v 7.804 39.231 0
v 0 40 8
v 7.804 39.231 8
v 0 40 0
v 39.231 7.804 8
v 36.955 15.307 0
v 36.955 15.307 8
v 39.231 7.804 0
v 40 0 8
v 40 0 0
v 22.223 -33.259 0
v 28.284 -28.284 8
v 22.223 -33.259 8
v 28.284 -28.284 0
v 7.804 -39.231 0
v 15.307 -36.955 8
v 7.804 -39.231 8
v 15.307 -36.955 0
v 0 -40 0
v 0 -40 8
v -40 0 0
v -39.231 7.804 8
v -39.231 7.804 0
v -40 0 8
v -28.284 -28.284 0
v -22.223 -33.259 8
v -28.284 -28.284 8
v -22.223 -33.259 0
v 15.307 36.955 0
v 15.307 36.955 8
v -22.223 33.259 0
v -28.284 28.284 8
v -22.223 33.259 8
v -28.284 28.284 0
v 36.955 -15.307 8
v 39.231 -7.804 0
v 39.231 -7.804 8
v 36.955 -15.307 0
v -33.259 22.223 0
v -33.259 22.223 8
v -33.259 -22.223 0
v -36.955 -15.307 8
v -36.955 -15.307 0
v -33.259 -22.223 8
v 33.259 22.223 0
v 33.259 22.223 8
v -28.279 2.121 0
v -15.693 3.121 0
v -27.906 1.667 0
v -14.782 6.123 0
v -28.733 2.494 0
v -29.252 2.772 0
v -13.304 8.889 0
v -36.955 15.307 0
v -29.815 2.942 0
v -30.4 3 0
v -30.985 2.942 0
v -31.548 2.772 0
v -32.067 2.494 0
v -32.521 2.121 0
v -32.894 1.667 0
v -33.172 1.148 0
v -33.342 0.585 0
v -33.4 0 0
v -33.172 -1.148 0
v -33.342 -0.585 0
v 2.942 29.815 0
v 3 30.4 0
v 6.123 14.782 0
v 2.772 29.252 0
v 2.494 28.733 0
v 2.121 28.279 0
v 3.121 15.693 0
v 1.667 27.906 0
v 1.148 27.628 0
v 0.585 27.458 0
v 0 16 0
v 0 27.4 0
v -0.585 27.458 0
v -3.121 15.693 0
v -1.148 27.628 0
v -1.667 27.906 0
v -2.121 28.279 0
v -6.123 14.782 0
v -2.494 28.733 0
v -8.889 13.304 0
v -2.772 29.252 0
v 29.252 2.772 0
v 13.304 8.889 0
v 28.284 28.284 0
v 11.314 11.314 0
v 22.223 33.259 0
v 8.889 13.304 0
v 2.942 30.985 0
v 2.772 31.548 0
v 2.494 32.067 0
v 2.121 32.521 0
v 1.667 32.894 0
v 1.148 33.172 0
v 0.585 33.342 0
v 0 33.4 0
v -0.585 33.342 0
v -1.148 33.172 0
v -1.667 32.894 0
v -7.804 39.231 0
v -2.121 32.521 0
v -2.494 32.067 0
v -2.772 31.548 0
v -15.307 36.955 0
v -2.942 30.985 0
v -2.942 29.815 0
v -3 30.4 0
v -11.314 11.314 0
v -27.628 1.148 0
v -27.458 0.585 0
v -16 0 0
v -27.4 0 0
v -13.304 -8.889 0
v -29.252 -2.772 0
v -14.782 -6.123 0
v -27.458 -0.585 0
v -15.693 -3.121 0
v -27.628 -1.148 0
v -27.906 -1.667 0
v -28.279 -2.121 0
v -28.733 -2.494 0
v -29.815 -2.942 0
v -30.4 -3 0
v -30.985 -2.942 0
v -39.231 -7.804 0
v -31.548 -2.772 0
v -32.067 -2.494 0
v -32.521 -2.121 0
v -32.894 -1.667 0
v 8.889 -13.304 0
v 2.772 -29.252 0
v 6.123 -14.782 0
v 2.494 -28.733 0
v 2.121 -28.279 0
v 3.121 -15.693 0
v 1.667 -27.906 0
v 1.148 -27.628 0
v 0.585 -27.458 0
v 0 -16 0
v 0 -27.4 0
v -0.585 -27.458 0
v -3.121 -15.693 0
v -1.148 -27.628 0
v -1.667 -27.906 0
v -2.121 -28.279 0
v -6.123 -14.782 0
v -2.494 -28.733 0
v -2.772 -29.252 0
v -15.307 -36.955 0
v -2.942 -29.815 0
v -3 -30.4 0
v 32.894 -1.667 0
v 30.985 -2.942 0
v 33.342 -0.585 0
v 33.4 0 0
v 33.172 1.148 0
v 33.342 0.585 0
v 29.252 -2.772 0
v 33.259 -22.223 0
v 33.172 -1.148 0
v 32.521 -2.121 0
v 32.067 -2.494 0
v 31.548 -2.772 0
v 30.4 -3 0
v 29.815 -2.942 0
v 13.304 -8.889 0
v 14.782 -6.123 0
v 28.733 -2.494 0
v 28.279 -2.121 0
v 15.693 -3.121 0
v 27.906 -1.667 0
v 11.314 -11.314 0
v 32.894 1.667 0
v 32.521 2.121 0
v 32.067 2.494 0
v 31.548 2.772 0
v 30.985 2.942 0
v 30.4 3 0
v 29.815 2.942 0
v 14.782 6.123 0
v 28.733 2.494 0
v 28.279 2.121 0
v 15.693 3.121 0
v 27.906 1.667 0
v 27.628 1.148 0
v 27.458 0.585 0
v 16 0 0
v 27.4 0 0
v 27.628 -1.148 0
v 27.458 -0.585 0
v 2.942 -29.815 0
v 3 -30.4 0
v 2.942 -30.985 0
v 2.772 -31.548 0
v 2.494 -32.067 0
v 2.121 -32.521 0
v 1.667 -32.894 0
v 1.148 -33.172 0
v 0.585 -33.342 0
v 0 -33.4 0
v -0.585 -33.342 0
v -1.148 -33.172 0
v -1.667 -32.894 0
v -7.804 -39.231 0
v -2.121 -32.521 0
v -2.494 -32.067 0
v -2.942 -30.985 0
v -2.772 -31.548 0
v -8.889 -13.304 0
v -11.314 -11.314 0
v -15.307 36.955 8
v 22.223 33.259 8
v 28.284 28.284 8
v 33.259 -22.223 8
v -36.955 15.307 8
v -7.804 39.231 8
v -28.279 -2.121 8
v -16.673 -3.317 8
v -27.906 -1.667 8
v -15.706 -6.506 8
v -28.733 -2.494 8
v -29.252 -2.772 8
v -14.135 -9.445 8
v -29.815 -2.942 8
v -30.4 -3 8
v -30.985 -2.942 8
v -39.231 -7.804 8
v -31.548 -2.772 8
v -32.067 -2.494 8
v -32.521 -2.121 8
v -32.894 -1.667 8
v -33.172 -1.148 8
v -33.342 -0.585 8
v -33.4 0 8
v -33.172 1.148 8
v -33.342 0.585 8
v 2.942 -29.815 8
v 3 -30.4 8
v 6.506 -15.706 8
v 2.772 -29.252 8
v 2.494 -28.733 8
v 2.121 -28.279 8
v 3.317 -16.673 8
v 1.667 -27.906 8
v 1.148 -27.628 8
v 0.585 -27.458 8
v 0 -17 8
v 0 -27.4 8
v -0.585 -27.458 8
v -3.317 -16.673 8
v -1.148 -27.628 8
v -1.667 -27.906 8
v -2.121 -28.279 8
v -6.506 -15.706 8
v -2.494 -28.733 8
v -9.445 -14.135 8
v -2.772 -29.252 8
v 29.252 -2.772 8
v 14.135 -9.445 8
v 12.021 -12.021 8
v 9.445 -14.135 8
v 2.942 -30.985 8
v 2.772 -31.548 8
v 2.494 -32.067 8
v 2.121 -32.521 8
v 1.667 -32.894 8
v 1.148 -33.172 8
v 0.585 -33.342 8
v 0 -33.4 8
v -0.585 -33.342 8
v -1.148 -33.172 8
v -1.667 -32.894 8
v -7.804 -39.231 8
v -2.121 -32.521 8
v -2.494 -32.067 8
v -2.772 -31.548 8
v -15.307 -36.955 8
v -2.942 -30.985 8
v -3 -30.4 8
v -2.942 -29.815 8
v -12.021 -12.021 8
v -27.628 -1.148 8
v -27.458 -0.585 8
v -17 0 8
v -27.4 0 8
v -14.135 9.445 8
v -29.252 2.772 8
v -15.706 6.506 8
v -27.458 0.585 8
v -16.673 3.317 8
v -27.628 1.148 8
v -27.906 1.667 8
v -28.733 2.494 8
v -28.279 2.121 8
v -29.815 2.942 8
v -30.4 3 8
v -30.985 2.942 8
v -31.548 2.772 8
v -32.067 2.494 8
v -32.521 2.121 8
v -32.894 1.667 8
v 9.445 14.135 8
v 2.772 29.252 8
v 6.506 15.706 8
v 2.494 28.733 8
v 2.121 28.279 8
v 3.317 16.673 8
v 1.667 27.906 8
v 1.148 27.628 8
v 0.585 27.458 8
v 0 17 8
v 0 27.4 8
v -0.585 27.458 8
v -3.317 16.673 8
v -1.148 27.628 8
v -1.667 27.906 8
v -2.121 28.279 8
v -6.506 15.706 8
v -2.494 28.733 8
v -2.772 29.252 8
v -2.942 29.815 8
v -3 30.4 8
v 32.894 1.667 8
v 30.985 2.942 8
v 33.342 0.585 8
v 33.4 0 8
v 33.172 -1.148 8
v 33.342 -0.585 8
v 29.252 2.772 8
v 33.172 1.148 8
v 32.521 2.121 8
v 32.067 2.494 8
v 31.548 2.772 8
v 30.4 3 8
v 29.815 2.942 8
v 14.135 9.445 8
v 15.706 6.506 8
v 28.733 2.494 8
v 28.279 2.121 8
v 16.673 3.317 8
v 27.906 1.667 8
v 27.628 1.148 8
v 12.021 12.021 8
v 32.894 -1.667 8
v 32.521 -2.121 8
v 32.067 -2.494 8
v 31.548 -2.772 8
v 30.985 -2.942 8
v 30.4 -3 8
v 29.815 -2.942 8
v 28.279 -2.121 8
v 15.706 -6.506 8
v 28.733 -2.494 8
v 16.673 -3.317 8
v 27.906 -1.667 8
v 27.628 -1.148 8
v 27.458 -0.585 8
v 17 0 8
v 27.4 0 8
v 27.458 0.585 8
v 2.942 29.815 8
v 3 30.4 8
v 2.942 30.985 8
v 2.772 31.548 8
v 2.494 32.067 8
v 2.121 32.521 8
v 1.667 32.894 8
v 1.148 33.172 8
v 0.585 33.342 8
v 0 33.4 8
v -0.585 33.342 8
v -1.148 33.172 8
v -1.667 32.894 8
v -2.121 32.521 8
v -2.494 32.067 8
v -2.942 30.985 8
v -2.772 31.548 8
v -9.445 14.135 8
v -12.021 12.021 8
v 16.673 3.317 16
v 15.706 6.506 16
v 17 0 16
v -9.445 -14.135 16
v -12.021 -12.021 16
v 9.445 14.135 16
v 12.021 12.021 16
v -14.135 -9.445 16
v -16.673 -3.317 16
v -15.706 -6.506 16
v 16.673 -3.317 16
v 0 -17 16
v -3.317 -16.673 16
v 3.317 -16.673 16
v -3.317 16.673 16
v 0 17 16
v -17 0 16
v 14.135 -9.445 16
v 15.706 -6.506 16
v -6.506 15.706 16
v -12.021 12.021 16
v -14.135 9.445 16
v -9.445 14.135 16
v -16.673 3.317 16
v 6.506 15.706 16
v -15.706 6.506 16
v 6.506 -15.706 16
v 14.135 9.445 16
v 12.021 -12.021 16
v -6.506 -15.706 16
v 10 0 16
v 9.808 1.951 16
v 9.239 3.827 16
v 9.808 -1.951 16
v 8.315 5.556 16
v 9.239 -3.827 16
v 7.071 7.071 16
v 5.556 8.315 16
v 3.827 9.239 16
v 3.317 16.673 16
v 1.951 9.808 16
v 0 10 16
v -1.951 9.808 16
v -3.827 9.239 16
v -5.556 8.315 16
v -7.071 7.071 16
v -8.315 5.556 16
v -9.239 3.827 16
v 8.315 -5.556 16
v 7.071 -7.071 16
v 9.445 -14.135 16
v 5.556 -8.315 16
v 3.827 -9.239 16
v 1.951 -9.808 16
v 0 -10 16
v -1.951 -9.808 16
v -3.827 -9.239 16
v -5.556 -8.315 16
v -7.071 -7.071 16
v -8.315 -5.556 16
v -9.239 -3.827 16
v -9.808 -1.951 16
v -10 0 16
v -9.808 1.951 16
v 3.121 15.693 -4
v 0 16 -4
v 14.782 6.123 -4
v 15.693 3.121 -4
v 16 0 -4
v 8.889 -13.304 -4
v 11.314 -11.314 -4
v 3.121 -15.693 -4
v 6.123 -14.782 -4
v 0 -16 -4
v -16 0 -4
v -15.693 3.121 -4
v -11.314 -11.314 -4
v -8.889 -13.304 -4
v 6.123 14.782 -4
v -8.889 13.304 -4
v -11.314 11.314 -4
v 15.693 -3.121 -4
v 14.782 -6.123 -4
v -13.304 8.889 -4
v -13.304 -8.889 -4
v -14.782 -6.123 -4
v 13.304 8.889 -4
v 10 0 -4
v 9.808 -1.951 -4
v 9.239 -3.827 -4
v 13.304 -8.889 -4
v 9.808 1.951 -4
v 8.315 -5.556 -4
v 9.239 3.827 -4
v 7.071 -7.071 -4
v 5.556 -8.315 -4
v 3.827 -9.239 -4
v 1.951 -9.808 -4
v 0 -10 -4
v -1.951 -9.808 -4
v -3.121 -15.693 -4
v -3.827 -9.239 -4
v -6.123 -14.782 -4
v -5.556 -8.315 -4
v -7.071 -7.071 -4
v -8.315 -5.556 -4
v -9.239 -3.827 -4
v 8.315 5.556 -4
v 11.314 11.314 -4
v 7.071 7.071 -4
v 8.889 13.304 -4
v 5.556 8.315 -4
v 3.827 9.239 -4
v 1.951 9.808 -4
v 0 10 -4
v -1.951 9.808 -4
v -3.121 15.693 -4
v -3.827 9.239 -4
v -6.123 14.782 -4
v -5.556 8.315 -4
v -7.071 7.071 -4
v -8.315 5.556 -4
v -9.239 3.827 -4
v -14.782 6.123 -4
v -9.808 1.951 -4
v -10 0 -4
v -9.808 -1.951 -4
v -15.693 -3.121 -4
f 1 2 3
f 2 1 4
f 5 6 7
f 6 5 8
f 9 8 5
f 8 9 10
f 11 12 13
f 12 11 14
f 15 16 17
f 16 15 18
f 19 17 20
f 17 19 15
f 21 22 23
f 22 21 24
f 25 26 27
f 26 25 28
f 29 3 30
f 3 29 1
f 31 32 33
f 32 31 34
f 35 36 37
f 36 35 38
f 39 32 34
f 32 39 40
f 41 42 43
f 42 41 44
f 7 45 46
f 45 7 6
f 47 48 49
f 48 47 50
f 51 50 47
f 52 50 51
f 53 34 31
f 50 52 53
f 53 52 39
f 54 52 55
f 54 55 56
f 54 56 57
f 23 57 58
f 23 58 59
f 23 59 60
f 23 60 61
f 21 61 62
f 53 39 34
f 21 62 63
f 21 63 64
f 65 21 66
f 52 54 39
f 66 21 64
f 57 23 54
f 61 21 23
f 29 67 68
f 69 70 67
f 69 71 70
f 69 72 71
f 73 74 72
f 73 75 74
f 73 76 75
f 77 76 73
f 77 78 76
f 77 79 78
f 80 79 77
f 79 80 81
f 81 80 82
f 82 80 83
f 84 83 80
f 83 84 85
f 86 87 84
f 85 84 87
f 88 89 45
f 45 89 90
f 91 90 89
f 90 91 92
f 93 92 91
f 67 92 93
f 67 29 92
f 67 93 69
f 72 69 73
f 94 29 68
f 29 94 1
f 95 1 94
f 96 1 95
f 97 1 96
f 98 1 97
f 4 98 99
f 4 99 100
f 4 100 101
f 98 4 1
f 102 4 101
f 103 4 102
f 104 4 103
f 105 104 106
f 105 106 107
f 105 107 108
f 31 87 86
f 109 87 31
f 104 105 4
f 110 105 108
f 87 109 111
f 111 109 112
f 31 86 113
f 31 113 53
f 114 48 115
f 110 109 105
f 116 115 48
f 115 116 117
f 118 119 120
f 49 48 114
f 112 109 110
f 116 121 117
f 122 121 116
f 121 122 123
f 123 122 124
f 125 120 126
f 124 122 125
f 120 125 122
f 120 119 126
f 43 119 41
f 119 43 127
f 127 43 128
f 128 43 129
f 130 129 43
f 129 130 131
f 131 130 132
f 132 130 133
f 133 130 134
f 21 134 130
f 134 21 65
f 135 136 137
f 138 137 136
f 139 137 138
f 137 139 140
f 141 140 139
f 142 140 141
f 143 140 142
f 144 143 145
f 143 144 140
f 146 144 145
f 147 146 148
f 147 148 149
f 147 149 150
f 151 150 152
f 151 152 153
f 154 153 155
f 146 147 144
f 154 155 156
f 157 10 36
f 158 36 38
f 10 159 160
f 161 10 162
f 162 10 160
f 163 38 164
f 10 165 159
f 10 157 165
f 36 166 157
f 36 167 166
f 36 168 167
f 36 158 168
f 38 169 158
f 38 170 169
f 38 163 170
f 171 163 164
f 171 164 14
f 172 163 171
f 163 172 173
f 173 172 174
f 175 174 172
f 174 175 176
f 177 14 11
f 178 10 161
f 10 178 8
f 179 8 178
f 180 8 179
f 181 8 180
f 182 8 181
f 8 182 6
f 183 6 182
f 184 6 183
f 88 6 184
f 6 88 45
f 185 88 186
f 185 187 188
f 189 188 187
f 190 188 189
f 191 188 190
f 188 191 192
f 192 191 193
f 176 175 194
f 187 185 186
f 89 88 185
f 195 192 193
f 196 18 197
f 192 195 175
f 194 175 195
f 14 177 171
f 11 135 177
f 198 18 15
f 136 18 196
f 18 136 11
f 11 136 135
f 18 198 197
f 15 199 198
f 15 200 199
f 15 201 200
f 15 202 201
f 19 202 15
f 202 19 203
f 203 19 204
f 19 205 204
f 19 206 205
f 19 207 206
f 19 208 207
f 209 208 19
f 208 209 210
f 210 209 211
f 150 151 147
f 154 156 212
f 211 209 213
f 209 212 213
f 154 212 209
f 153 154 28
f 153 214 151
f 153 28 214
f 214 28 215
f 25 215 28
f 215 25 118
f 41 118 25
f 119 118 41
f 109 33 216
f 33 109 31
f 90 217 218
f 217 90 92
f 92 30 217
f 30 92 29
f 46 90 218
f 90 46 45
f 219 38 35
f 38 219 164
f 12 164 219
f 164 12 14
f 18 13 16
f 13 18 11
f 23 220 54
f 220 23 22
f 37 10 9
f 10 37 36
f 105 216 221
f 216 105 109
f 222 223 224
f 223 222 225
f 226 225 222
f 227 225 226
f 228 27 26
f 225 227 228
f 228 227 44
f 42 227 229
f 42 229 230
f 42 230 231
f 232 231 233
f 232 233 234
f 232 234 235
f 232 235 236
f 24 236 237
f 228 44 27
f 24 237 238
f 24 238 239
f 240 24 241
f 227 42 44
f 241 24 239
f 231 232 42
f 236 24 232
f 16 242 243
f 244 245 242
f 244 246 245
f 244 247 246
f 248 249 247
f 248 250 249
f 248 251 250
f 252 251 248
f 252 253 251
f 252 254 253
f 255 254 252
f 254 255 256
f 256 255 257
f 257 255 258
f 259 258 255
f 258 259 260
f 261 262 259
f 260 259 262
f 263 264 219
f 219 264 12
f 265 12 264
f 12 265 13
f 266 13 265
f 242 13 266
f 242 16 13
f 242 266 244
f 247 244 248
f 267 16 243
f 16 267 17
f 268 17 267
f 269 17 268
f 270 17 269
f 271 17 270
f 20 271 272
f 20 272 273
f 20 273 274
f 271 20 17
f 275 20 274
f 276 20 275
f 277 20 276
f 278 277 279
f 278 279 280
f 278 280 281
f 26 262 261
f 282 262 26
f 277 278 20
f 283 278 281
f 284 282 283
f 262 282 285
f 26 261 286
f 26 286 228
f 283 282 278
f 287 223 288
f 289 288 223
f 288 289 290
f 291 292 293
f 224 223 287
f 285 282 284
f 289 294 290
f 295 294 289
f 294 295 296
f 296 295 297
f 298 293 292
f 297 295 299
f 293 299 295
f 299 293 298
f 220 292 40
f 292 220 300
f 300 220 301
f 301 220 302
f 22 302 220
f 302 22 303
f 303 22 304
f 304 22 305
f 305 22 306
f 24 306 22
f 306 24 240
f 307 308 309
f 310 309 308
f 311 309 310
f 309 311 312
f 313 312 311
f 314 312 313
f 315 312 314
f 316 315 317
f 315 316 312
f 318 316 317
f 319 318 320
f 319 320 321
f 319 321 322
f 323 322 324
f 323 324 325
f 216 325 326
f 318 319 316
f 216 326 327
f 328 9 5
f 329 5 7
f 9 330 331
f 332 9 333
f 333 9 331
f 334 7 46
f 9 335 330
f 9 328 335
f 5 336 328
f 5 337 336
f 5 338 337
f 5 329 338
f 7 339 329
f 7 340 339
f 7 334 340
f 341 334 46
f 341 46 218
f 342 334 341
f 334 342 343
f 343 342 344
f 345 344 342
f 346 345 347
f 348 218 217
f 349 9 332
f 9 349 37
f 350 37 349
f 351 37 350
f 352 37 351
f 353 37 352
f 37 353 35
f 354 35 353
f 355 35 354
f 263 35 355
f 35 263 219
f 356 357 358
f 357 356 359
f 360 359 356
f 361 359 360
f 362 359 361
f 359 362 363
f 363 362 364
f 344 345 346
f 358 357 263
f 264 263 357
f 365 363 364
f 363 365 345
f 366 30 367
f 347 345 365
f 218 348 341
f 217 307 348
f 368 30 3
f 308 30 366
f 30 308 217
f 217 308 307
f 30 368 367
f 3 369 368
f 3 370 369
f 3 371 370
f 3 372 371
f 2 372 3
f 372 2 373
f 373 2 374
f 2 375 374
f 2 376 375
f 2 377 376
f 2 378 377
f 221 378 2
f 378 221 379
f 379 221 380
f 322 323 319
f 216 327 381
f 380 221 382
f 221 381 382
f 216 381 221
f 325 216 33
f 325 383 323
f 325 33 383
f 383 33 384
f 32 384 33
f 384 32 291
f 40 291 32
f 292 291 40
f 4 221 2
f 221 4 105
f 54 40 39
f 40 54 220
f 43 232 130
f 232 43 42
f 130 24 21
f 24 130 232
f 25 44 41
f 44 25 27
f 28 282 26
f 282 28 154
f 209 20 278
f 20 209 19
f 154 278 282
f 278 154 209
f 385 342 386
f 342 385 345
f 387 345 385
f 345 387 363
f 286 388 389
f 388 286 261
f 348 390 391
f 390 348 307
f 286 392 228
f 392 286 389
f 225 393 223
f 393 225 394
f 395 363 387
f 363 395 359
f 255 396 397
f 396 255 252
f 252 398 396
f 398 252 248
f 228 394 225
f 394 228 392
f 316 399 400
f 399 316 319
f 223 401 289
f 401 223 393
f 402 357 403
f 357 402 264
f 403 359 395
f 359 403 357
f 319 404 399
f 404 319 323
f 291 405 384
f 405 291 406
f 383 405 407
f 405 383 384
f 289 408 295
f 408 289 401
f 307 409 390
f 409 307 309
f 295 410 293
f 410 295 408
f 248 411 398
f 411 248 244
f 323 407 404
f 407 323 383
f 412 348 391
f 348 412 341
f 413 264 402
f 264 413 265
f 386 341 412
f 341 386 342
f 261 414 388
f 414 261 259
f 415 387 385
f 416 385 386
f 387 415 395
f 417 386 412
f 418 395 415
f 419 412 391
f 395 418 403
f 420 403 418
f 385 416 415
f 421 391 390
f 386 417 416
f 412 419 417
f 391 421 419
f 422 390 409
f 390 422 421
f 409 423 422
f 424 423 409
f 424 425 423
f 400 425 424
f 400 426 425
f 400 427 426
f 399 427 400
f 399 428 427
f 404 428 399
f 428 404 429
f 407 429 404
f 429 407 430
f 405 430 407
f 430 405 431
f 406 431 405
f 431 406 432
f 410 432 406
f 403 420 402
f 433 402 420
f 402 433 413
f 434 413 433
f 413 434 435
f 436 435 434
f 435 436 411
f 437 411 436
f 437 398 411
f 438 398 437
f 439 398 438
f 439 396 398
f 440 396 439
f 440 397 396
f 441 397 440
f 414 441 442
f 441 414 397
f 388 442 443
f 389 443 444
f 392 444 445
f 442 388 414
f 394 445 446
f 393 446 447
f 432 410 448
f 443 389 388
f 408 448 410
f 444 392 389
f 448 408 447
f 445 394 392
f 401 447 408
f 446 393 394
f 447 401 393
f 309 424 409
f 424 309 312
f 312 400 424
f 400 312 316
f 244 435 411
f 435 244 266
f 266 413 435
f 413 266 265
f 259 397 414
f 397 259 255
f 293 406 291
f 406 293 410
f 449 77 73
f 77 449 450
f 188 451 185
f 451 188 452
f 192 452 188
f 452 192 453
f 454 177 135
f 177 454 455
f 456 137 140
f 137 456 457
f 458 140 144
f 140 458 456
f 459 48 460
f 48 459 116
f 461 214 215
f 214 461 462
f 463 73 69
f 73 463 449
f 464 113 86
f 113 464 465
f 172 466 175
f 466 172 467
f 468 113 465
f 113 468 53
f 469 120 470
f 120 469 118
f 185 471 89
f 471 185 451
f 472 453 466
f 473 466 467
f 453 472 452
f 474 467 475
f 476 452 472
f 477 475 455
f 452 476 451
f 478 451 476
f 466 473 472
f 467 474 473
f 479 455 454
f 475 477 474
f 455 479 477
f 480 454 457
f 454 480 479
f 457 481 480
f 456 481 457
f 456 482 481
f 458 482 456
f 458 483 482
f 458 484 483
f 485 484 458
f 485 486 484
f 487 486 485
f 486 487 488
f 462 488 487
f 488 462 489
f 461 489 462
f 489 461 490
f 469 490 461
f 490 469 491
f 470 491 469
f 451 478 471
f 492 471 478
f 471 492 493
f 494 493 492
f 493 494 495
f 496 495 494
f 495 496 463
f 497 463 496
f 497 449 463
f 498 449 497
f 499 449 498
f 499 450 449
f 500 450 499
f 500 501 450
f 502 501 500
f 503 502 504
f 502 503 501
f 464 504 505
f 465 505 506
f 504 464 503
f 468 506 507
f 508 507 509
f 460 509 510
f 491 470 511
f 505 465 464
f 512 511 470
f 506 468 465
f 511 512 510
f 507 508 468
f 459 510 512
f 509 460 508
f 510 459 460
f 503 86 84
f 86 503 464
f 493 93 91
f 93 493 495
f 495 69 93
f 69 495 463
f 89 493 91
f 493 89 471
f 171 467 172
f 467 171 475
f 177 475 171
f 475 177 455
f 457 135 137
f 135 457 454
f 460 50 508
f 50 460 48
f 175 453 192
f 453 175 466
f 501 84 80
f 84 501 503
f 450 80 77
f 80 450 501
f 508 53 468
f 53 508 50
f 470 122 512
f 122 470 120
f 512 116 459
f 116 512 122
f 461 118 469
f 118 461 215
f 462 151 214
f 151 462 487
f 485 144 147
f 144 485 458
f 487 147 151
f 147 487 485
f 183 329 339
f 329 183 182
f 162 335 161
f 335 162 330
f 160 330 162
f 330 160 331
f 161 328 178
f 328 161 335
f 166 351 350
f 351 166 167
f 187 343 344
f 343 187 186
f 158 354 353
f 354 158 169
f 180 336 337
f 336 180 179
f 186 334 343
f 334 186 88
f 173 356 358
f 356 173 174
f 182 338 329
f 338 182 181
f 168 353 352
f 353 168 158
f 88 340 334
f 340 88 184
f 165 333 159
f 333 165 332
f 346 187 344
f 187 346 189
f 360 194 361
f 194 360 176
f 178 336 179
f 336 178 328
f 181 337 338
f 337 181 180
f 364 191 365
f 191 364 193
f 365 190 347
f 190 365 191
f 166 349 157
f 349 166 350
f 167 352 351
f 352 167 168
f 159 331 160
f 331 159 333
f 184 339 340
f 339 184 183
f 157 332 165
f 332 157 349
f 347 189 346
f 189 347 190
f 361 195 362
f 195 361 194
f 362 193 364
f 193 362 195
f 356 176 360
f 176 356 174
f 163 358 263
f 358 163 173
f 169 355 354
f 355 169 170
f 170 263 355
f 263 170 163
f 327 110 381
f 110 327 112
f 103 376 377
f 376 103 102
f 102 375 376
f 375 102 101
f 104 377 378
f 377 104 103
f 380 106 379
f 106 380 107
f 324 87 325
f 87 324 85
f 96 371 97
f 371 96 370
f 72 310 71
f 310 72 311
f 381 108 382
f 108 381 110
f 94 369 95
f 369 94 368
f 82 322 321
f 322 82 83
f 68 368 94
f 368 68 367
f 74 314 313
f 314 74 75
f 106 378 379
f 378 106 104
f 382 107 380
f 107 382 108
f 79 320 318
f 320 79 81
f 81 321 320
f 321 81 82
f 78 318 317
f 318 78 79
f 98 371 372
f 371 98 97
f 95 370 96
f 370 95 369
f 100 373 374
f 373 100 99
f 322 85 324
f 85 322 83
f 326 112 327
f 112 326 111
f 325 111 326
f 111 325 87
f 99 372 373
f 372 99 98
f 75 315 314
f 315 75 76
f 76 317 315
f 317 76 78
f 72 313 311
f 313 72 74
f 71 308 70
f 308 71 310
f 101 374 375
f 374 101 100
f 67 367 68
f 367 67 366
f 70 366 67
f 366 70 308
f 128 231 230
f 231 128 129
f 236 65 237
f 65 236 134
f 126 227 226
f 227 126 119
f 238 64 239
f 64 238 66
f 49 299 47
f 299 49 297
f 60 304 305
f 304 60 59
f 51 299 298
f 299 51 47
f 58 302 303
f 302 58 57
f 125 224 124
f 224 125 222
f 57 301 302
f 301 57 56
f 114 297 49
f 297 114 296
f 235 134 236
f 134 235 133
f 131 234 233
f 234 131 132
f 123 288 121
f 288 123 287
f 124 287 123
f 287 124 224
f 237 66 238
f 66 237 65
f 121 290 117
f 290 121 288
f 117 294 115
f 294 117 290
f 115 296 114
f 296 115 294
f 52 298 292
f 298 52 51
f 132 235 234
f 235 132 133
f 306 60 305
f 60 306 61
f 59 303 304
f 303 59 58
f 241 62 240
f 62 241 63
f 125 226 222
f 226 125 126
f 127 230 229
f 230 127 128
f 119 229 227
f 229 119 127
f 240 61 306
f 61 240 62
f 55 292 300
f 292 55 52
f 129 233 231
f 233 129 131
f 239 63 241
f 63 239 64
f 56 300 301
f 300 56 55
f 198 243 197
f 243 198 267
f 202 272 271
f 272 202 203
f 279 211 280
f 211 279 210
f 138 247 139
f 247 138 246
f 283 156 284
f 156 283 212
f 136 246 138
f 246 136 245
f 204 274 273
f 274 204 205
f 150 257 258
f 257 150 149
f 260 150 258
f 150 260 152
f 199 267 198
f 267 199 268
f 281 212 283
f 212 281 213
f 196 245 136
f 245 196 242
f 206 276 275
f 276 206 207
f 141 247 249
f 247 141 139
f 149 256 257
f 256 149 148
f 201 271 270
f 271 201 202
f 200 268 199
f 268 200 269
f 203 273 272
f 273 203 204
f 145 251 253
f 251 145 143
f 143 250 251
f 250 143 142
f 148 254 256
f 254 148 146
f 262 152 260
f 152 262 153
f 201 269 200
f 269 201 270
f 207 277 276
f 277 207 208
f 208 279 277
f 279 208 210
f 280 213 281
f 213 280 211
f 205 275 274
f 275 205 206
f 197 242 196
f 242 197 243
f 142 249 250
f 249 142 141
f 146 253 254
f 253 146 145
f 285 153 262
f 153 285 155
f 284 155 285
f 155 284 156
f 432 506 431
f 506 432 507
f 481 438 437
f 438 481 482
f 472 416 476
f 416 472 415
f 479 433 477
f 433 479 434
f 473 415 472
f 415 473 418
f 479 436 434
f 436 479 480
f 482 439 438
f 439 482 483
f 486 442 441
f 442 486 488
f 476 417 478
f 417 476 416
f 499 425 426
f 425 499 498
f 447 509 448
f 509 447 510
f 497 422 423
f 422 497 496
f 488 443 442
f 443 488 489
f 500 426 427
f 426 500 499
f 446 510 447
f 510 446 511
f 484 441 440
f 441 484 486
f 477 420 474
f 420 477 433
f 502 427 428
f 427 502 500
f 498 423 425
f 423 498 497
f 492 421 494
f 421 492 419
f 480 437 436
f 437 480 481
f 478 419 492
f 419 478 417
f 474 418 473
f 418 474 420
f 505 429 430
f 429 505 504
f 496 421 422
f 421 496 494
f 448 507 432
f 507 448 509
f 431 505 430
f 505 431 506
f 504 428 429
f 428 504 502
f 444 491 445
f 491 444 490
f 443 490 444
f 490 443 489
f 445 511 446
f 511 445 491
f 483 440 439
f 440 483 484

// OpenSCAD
$fn = 32;

// ----------------------------------------------------------------------
// Bolt-circle flange: 80 mm outside, 4 bolt holes, bore 20 mm
// ----------------------------------------------------------------------

// --- parameters (mm) ---
flange_d = 80;            // flange outside diameter
flange_t = 8;             // flange thickness
bolts = 4;                // number of bolt holes
bolt_d = 6;               // bolt clearance
bolt_r = 30.4;            // bolt circle radius
bore_d = 20;              // centre bore
hub_d = 34;               // raised hub diameter
hub_h = 8;                // raised hub height
spigot_d = 32;            // spigot diameter
spigot_h = 5;             // spigot height below the flange
sink = 1;                 // overlap into the flange

module body() {
  cylinder(h = flange_t, d = flange_d);
  /* raised hub, sunk 1 mm into the flange */
  translate([0, 0, flange_t - 1]) cylinder(h = hub_h + 1, d = hub_d);
  /* spigot on the back face, sunk into the flange */
  translate([0, 0, -spigot_h + sink]) cylinder(h = spigot_h, d = spigot_d);
}

difference() {
  body();
  /* bolt circle */
  for (i = [0 : bolts - 1]) rotate([0, 0, i * 360 / bolts]) translate([bolt_r, 0, -spigot_h - 1]) cylinder(h = flange_t + hub_h + spigot_h + 3, d = bolt_d);
  translate([0, 0, -spigot_h - 1]) cylinder(h = flange_t + hub_h + spigot_h + 3, d = bore_d);
}
